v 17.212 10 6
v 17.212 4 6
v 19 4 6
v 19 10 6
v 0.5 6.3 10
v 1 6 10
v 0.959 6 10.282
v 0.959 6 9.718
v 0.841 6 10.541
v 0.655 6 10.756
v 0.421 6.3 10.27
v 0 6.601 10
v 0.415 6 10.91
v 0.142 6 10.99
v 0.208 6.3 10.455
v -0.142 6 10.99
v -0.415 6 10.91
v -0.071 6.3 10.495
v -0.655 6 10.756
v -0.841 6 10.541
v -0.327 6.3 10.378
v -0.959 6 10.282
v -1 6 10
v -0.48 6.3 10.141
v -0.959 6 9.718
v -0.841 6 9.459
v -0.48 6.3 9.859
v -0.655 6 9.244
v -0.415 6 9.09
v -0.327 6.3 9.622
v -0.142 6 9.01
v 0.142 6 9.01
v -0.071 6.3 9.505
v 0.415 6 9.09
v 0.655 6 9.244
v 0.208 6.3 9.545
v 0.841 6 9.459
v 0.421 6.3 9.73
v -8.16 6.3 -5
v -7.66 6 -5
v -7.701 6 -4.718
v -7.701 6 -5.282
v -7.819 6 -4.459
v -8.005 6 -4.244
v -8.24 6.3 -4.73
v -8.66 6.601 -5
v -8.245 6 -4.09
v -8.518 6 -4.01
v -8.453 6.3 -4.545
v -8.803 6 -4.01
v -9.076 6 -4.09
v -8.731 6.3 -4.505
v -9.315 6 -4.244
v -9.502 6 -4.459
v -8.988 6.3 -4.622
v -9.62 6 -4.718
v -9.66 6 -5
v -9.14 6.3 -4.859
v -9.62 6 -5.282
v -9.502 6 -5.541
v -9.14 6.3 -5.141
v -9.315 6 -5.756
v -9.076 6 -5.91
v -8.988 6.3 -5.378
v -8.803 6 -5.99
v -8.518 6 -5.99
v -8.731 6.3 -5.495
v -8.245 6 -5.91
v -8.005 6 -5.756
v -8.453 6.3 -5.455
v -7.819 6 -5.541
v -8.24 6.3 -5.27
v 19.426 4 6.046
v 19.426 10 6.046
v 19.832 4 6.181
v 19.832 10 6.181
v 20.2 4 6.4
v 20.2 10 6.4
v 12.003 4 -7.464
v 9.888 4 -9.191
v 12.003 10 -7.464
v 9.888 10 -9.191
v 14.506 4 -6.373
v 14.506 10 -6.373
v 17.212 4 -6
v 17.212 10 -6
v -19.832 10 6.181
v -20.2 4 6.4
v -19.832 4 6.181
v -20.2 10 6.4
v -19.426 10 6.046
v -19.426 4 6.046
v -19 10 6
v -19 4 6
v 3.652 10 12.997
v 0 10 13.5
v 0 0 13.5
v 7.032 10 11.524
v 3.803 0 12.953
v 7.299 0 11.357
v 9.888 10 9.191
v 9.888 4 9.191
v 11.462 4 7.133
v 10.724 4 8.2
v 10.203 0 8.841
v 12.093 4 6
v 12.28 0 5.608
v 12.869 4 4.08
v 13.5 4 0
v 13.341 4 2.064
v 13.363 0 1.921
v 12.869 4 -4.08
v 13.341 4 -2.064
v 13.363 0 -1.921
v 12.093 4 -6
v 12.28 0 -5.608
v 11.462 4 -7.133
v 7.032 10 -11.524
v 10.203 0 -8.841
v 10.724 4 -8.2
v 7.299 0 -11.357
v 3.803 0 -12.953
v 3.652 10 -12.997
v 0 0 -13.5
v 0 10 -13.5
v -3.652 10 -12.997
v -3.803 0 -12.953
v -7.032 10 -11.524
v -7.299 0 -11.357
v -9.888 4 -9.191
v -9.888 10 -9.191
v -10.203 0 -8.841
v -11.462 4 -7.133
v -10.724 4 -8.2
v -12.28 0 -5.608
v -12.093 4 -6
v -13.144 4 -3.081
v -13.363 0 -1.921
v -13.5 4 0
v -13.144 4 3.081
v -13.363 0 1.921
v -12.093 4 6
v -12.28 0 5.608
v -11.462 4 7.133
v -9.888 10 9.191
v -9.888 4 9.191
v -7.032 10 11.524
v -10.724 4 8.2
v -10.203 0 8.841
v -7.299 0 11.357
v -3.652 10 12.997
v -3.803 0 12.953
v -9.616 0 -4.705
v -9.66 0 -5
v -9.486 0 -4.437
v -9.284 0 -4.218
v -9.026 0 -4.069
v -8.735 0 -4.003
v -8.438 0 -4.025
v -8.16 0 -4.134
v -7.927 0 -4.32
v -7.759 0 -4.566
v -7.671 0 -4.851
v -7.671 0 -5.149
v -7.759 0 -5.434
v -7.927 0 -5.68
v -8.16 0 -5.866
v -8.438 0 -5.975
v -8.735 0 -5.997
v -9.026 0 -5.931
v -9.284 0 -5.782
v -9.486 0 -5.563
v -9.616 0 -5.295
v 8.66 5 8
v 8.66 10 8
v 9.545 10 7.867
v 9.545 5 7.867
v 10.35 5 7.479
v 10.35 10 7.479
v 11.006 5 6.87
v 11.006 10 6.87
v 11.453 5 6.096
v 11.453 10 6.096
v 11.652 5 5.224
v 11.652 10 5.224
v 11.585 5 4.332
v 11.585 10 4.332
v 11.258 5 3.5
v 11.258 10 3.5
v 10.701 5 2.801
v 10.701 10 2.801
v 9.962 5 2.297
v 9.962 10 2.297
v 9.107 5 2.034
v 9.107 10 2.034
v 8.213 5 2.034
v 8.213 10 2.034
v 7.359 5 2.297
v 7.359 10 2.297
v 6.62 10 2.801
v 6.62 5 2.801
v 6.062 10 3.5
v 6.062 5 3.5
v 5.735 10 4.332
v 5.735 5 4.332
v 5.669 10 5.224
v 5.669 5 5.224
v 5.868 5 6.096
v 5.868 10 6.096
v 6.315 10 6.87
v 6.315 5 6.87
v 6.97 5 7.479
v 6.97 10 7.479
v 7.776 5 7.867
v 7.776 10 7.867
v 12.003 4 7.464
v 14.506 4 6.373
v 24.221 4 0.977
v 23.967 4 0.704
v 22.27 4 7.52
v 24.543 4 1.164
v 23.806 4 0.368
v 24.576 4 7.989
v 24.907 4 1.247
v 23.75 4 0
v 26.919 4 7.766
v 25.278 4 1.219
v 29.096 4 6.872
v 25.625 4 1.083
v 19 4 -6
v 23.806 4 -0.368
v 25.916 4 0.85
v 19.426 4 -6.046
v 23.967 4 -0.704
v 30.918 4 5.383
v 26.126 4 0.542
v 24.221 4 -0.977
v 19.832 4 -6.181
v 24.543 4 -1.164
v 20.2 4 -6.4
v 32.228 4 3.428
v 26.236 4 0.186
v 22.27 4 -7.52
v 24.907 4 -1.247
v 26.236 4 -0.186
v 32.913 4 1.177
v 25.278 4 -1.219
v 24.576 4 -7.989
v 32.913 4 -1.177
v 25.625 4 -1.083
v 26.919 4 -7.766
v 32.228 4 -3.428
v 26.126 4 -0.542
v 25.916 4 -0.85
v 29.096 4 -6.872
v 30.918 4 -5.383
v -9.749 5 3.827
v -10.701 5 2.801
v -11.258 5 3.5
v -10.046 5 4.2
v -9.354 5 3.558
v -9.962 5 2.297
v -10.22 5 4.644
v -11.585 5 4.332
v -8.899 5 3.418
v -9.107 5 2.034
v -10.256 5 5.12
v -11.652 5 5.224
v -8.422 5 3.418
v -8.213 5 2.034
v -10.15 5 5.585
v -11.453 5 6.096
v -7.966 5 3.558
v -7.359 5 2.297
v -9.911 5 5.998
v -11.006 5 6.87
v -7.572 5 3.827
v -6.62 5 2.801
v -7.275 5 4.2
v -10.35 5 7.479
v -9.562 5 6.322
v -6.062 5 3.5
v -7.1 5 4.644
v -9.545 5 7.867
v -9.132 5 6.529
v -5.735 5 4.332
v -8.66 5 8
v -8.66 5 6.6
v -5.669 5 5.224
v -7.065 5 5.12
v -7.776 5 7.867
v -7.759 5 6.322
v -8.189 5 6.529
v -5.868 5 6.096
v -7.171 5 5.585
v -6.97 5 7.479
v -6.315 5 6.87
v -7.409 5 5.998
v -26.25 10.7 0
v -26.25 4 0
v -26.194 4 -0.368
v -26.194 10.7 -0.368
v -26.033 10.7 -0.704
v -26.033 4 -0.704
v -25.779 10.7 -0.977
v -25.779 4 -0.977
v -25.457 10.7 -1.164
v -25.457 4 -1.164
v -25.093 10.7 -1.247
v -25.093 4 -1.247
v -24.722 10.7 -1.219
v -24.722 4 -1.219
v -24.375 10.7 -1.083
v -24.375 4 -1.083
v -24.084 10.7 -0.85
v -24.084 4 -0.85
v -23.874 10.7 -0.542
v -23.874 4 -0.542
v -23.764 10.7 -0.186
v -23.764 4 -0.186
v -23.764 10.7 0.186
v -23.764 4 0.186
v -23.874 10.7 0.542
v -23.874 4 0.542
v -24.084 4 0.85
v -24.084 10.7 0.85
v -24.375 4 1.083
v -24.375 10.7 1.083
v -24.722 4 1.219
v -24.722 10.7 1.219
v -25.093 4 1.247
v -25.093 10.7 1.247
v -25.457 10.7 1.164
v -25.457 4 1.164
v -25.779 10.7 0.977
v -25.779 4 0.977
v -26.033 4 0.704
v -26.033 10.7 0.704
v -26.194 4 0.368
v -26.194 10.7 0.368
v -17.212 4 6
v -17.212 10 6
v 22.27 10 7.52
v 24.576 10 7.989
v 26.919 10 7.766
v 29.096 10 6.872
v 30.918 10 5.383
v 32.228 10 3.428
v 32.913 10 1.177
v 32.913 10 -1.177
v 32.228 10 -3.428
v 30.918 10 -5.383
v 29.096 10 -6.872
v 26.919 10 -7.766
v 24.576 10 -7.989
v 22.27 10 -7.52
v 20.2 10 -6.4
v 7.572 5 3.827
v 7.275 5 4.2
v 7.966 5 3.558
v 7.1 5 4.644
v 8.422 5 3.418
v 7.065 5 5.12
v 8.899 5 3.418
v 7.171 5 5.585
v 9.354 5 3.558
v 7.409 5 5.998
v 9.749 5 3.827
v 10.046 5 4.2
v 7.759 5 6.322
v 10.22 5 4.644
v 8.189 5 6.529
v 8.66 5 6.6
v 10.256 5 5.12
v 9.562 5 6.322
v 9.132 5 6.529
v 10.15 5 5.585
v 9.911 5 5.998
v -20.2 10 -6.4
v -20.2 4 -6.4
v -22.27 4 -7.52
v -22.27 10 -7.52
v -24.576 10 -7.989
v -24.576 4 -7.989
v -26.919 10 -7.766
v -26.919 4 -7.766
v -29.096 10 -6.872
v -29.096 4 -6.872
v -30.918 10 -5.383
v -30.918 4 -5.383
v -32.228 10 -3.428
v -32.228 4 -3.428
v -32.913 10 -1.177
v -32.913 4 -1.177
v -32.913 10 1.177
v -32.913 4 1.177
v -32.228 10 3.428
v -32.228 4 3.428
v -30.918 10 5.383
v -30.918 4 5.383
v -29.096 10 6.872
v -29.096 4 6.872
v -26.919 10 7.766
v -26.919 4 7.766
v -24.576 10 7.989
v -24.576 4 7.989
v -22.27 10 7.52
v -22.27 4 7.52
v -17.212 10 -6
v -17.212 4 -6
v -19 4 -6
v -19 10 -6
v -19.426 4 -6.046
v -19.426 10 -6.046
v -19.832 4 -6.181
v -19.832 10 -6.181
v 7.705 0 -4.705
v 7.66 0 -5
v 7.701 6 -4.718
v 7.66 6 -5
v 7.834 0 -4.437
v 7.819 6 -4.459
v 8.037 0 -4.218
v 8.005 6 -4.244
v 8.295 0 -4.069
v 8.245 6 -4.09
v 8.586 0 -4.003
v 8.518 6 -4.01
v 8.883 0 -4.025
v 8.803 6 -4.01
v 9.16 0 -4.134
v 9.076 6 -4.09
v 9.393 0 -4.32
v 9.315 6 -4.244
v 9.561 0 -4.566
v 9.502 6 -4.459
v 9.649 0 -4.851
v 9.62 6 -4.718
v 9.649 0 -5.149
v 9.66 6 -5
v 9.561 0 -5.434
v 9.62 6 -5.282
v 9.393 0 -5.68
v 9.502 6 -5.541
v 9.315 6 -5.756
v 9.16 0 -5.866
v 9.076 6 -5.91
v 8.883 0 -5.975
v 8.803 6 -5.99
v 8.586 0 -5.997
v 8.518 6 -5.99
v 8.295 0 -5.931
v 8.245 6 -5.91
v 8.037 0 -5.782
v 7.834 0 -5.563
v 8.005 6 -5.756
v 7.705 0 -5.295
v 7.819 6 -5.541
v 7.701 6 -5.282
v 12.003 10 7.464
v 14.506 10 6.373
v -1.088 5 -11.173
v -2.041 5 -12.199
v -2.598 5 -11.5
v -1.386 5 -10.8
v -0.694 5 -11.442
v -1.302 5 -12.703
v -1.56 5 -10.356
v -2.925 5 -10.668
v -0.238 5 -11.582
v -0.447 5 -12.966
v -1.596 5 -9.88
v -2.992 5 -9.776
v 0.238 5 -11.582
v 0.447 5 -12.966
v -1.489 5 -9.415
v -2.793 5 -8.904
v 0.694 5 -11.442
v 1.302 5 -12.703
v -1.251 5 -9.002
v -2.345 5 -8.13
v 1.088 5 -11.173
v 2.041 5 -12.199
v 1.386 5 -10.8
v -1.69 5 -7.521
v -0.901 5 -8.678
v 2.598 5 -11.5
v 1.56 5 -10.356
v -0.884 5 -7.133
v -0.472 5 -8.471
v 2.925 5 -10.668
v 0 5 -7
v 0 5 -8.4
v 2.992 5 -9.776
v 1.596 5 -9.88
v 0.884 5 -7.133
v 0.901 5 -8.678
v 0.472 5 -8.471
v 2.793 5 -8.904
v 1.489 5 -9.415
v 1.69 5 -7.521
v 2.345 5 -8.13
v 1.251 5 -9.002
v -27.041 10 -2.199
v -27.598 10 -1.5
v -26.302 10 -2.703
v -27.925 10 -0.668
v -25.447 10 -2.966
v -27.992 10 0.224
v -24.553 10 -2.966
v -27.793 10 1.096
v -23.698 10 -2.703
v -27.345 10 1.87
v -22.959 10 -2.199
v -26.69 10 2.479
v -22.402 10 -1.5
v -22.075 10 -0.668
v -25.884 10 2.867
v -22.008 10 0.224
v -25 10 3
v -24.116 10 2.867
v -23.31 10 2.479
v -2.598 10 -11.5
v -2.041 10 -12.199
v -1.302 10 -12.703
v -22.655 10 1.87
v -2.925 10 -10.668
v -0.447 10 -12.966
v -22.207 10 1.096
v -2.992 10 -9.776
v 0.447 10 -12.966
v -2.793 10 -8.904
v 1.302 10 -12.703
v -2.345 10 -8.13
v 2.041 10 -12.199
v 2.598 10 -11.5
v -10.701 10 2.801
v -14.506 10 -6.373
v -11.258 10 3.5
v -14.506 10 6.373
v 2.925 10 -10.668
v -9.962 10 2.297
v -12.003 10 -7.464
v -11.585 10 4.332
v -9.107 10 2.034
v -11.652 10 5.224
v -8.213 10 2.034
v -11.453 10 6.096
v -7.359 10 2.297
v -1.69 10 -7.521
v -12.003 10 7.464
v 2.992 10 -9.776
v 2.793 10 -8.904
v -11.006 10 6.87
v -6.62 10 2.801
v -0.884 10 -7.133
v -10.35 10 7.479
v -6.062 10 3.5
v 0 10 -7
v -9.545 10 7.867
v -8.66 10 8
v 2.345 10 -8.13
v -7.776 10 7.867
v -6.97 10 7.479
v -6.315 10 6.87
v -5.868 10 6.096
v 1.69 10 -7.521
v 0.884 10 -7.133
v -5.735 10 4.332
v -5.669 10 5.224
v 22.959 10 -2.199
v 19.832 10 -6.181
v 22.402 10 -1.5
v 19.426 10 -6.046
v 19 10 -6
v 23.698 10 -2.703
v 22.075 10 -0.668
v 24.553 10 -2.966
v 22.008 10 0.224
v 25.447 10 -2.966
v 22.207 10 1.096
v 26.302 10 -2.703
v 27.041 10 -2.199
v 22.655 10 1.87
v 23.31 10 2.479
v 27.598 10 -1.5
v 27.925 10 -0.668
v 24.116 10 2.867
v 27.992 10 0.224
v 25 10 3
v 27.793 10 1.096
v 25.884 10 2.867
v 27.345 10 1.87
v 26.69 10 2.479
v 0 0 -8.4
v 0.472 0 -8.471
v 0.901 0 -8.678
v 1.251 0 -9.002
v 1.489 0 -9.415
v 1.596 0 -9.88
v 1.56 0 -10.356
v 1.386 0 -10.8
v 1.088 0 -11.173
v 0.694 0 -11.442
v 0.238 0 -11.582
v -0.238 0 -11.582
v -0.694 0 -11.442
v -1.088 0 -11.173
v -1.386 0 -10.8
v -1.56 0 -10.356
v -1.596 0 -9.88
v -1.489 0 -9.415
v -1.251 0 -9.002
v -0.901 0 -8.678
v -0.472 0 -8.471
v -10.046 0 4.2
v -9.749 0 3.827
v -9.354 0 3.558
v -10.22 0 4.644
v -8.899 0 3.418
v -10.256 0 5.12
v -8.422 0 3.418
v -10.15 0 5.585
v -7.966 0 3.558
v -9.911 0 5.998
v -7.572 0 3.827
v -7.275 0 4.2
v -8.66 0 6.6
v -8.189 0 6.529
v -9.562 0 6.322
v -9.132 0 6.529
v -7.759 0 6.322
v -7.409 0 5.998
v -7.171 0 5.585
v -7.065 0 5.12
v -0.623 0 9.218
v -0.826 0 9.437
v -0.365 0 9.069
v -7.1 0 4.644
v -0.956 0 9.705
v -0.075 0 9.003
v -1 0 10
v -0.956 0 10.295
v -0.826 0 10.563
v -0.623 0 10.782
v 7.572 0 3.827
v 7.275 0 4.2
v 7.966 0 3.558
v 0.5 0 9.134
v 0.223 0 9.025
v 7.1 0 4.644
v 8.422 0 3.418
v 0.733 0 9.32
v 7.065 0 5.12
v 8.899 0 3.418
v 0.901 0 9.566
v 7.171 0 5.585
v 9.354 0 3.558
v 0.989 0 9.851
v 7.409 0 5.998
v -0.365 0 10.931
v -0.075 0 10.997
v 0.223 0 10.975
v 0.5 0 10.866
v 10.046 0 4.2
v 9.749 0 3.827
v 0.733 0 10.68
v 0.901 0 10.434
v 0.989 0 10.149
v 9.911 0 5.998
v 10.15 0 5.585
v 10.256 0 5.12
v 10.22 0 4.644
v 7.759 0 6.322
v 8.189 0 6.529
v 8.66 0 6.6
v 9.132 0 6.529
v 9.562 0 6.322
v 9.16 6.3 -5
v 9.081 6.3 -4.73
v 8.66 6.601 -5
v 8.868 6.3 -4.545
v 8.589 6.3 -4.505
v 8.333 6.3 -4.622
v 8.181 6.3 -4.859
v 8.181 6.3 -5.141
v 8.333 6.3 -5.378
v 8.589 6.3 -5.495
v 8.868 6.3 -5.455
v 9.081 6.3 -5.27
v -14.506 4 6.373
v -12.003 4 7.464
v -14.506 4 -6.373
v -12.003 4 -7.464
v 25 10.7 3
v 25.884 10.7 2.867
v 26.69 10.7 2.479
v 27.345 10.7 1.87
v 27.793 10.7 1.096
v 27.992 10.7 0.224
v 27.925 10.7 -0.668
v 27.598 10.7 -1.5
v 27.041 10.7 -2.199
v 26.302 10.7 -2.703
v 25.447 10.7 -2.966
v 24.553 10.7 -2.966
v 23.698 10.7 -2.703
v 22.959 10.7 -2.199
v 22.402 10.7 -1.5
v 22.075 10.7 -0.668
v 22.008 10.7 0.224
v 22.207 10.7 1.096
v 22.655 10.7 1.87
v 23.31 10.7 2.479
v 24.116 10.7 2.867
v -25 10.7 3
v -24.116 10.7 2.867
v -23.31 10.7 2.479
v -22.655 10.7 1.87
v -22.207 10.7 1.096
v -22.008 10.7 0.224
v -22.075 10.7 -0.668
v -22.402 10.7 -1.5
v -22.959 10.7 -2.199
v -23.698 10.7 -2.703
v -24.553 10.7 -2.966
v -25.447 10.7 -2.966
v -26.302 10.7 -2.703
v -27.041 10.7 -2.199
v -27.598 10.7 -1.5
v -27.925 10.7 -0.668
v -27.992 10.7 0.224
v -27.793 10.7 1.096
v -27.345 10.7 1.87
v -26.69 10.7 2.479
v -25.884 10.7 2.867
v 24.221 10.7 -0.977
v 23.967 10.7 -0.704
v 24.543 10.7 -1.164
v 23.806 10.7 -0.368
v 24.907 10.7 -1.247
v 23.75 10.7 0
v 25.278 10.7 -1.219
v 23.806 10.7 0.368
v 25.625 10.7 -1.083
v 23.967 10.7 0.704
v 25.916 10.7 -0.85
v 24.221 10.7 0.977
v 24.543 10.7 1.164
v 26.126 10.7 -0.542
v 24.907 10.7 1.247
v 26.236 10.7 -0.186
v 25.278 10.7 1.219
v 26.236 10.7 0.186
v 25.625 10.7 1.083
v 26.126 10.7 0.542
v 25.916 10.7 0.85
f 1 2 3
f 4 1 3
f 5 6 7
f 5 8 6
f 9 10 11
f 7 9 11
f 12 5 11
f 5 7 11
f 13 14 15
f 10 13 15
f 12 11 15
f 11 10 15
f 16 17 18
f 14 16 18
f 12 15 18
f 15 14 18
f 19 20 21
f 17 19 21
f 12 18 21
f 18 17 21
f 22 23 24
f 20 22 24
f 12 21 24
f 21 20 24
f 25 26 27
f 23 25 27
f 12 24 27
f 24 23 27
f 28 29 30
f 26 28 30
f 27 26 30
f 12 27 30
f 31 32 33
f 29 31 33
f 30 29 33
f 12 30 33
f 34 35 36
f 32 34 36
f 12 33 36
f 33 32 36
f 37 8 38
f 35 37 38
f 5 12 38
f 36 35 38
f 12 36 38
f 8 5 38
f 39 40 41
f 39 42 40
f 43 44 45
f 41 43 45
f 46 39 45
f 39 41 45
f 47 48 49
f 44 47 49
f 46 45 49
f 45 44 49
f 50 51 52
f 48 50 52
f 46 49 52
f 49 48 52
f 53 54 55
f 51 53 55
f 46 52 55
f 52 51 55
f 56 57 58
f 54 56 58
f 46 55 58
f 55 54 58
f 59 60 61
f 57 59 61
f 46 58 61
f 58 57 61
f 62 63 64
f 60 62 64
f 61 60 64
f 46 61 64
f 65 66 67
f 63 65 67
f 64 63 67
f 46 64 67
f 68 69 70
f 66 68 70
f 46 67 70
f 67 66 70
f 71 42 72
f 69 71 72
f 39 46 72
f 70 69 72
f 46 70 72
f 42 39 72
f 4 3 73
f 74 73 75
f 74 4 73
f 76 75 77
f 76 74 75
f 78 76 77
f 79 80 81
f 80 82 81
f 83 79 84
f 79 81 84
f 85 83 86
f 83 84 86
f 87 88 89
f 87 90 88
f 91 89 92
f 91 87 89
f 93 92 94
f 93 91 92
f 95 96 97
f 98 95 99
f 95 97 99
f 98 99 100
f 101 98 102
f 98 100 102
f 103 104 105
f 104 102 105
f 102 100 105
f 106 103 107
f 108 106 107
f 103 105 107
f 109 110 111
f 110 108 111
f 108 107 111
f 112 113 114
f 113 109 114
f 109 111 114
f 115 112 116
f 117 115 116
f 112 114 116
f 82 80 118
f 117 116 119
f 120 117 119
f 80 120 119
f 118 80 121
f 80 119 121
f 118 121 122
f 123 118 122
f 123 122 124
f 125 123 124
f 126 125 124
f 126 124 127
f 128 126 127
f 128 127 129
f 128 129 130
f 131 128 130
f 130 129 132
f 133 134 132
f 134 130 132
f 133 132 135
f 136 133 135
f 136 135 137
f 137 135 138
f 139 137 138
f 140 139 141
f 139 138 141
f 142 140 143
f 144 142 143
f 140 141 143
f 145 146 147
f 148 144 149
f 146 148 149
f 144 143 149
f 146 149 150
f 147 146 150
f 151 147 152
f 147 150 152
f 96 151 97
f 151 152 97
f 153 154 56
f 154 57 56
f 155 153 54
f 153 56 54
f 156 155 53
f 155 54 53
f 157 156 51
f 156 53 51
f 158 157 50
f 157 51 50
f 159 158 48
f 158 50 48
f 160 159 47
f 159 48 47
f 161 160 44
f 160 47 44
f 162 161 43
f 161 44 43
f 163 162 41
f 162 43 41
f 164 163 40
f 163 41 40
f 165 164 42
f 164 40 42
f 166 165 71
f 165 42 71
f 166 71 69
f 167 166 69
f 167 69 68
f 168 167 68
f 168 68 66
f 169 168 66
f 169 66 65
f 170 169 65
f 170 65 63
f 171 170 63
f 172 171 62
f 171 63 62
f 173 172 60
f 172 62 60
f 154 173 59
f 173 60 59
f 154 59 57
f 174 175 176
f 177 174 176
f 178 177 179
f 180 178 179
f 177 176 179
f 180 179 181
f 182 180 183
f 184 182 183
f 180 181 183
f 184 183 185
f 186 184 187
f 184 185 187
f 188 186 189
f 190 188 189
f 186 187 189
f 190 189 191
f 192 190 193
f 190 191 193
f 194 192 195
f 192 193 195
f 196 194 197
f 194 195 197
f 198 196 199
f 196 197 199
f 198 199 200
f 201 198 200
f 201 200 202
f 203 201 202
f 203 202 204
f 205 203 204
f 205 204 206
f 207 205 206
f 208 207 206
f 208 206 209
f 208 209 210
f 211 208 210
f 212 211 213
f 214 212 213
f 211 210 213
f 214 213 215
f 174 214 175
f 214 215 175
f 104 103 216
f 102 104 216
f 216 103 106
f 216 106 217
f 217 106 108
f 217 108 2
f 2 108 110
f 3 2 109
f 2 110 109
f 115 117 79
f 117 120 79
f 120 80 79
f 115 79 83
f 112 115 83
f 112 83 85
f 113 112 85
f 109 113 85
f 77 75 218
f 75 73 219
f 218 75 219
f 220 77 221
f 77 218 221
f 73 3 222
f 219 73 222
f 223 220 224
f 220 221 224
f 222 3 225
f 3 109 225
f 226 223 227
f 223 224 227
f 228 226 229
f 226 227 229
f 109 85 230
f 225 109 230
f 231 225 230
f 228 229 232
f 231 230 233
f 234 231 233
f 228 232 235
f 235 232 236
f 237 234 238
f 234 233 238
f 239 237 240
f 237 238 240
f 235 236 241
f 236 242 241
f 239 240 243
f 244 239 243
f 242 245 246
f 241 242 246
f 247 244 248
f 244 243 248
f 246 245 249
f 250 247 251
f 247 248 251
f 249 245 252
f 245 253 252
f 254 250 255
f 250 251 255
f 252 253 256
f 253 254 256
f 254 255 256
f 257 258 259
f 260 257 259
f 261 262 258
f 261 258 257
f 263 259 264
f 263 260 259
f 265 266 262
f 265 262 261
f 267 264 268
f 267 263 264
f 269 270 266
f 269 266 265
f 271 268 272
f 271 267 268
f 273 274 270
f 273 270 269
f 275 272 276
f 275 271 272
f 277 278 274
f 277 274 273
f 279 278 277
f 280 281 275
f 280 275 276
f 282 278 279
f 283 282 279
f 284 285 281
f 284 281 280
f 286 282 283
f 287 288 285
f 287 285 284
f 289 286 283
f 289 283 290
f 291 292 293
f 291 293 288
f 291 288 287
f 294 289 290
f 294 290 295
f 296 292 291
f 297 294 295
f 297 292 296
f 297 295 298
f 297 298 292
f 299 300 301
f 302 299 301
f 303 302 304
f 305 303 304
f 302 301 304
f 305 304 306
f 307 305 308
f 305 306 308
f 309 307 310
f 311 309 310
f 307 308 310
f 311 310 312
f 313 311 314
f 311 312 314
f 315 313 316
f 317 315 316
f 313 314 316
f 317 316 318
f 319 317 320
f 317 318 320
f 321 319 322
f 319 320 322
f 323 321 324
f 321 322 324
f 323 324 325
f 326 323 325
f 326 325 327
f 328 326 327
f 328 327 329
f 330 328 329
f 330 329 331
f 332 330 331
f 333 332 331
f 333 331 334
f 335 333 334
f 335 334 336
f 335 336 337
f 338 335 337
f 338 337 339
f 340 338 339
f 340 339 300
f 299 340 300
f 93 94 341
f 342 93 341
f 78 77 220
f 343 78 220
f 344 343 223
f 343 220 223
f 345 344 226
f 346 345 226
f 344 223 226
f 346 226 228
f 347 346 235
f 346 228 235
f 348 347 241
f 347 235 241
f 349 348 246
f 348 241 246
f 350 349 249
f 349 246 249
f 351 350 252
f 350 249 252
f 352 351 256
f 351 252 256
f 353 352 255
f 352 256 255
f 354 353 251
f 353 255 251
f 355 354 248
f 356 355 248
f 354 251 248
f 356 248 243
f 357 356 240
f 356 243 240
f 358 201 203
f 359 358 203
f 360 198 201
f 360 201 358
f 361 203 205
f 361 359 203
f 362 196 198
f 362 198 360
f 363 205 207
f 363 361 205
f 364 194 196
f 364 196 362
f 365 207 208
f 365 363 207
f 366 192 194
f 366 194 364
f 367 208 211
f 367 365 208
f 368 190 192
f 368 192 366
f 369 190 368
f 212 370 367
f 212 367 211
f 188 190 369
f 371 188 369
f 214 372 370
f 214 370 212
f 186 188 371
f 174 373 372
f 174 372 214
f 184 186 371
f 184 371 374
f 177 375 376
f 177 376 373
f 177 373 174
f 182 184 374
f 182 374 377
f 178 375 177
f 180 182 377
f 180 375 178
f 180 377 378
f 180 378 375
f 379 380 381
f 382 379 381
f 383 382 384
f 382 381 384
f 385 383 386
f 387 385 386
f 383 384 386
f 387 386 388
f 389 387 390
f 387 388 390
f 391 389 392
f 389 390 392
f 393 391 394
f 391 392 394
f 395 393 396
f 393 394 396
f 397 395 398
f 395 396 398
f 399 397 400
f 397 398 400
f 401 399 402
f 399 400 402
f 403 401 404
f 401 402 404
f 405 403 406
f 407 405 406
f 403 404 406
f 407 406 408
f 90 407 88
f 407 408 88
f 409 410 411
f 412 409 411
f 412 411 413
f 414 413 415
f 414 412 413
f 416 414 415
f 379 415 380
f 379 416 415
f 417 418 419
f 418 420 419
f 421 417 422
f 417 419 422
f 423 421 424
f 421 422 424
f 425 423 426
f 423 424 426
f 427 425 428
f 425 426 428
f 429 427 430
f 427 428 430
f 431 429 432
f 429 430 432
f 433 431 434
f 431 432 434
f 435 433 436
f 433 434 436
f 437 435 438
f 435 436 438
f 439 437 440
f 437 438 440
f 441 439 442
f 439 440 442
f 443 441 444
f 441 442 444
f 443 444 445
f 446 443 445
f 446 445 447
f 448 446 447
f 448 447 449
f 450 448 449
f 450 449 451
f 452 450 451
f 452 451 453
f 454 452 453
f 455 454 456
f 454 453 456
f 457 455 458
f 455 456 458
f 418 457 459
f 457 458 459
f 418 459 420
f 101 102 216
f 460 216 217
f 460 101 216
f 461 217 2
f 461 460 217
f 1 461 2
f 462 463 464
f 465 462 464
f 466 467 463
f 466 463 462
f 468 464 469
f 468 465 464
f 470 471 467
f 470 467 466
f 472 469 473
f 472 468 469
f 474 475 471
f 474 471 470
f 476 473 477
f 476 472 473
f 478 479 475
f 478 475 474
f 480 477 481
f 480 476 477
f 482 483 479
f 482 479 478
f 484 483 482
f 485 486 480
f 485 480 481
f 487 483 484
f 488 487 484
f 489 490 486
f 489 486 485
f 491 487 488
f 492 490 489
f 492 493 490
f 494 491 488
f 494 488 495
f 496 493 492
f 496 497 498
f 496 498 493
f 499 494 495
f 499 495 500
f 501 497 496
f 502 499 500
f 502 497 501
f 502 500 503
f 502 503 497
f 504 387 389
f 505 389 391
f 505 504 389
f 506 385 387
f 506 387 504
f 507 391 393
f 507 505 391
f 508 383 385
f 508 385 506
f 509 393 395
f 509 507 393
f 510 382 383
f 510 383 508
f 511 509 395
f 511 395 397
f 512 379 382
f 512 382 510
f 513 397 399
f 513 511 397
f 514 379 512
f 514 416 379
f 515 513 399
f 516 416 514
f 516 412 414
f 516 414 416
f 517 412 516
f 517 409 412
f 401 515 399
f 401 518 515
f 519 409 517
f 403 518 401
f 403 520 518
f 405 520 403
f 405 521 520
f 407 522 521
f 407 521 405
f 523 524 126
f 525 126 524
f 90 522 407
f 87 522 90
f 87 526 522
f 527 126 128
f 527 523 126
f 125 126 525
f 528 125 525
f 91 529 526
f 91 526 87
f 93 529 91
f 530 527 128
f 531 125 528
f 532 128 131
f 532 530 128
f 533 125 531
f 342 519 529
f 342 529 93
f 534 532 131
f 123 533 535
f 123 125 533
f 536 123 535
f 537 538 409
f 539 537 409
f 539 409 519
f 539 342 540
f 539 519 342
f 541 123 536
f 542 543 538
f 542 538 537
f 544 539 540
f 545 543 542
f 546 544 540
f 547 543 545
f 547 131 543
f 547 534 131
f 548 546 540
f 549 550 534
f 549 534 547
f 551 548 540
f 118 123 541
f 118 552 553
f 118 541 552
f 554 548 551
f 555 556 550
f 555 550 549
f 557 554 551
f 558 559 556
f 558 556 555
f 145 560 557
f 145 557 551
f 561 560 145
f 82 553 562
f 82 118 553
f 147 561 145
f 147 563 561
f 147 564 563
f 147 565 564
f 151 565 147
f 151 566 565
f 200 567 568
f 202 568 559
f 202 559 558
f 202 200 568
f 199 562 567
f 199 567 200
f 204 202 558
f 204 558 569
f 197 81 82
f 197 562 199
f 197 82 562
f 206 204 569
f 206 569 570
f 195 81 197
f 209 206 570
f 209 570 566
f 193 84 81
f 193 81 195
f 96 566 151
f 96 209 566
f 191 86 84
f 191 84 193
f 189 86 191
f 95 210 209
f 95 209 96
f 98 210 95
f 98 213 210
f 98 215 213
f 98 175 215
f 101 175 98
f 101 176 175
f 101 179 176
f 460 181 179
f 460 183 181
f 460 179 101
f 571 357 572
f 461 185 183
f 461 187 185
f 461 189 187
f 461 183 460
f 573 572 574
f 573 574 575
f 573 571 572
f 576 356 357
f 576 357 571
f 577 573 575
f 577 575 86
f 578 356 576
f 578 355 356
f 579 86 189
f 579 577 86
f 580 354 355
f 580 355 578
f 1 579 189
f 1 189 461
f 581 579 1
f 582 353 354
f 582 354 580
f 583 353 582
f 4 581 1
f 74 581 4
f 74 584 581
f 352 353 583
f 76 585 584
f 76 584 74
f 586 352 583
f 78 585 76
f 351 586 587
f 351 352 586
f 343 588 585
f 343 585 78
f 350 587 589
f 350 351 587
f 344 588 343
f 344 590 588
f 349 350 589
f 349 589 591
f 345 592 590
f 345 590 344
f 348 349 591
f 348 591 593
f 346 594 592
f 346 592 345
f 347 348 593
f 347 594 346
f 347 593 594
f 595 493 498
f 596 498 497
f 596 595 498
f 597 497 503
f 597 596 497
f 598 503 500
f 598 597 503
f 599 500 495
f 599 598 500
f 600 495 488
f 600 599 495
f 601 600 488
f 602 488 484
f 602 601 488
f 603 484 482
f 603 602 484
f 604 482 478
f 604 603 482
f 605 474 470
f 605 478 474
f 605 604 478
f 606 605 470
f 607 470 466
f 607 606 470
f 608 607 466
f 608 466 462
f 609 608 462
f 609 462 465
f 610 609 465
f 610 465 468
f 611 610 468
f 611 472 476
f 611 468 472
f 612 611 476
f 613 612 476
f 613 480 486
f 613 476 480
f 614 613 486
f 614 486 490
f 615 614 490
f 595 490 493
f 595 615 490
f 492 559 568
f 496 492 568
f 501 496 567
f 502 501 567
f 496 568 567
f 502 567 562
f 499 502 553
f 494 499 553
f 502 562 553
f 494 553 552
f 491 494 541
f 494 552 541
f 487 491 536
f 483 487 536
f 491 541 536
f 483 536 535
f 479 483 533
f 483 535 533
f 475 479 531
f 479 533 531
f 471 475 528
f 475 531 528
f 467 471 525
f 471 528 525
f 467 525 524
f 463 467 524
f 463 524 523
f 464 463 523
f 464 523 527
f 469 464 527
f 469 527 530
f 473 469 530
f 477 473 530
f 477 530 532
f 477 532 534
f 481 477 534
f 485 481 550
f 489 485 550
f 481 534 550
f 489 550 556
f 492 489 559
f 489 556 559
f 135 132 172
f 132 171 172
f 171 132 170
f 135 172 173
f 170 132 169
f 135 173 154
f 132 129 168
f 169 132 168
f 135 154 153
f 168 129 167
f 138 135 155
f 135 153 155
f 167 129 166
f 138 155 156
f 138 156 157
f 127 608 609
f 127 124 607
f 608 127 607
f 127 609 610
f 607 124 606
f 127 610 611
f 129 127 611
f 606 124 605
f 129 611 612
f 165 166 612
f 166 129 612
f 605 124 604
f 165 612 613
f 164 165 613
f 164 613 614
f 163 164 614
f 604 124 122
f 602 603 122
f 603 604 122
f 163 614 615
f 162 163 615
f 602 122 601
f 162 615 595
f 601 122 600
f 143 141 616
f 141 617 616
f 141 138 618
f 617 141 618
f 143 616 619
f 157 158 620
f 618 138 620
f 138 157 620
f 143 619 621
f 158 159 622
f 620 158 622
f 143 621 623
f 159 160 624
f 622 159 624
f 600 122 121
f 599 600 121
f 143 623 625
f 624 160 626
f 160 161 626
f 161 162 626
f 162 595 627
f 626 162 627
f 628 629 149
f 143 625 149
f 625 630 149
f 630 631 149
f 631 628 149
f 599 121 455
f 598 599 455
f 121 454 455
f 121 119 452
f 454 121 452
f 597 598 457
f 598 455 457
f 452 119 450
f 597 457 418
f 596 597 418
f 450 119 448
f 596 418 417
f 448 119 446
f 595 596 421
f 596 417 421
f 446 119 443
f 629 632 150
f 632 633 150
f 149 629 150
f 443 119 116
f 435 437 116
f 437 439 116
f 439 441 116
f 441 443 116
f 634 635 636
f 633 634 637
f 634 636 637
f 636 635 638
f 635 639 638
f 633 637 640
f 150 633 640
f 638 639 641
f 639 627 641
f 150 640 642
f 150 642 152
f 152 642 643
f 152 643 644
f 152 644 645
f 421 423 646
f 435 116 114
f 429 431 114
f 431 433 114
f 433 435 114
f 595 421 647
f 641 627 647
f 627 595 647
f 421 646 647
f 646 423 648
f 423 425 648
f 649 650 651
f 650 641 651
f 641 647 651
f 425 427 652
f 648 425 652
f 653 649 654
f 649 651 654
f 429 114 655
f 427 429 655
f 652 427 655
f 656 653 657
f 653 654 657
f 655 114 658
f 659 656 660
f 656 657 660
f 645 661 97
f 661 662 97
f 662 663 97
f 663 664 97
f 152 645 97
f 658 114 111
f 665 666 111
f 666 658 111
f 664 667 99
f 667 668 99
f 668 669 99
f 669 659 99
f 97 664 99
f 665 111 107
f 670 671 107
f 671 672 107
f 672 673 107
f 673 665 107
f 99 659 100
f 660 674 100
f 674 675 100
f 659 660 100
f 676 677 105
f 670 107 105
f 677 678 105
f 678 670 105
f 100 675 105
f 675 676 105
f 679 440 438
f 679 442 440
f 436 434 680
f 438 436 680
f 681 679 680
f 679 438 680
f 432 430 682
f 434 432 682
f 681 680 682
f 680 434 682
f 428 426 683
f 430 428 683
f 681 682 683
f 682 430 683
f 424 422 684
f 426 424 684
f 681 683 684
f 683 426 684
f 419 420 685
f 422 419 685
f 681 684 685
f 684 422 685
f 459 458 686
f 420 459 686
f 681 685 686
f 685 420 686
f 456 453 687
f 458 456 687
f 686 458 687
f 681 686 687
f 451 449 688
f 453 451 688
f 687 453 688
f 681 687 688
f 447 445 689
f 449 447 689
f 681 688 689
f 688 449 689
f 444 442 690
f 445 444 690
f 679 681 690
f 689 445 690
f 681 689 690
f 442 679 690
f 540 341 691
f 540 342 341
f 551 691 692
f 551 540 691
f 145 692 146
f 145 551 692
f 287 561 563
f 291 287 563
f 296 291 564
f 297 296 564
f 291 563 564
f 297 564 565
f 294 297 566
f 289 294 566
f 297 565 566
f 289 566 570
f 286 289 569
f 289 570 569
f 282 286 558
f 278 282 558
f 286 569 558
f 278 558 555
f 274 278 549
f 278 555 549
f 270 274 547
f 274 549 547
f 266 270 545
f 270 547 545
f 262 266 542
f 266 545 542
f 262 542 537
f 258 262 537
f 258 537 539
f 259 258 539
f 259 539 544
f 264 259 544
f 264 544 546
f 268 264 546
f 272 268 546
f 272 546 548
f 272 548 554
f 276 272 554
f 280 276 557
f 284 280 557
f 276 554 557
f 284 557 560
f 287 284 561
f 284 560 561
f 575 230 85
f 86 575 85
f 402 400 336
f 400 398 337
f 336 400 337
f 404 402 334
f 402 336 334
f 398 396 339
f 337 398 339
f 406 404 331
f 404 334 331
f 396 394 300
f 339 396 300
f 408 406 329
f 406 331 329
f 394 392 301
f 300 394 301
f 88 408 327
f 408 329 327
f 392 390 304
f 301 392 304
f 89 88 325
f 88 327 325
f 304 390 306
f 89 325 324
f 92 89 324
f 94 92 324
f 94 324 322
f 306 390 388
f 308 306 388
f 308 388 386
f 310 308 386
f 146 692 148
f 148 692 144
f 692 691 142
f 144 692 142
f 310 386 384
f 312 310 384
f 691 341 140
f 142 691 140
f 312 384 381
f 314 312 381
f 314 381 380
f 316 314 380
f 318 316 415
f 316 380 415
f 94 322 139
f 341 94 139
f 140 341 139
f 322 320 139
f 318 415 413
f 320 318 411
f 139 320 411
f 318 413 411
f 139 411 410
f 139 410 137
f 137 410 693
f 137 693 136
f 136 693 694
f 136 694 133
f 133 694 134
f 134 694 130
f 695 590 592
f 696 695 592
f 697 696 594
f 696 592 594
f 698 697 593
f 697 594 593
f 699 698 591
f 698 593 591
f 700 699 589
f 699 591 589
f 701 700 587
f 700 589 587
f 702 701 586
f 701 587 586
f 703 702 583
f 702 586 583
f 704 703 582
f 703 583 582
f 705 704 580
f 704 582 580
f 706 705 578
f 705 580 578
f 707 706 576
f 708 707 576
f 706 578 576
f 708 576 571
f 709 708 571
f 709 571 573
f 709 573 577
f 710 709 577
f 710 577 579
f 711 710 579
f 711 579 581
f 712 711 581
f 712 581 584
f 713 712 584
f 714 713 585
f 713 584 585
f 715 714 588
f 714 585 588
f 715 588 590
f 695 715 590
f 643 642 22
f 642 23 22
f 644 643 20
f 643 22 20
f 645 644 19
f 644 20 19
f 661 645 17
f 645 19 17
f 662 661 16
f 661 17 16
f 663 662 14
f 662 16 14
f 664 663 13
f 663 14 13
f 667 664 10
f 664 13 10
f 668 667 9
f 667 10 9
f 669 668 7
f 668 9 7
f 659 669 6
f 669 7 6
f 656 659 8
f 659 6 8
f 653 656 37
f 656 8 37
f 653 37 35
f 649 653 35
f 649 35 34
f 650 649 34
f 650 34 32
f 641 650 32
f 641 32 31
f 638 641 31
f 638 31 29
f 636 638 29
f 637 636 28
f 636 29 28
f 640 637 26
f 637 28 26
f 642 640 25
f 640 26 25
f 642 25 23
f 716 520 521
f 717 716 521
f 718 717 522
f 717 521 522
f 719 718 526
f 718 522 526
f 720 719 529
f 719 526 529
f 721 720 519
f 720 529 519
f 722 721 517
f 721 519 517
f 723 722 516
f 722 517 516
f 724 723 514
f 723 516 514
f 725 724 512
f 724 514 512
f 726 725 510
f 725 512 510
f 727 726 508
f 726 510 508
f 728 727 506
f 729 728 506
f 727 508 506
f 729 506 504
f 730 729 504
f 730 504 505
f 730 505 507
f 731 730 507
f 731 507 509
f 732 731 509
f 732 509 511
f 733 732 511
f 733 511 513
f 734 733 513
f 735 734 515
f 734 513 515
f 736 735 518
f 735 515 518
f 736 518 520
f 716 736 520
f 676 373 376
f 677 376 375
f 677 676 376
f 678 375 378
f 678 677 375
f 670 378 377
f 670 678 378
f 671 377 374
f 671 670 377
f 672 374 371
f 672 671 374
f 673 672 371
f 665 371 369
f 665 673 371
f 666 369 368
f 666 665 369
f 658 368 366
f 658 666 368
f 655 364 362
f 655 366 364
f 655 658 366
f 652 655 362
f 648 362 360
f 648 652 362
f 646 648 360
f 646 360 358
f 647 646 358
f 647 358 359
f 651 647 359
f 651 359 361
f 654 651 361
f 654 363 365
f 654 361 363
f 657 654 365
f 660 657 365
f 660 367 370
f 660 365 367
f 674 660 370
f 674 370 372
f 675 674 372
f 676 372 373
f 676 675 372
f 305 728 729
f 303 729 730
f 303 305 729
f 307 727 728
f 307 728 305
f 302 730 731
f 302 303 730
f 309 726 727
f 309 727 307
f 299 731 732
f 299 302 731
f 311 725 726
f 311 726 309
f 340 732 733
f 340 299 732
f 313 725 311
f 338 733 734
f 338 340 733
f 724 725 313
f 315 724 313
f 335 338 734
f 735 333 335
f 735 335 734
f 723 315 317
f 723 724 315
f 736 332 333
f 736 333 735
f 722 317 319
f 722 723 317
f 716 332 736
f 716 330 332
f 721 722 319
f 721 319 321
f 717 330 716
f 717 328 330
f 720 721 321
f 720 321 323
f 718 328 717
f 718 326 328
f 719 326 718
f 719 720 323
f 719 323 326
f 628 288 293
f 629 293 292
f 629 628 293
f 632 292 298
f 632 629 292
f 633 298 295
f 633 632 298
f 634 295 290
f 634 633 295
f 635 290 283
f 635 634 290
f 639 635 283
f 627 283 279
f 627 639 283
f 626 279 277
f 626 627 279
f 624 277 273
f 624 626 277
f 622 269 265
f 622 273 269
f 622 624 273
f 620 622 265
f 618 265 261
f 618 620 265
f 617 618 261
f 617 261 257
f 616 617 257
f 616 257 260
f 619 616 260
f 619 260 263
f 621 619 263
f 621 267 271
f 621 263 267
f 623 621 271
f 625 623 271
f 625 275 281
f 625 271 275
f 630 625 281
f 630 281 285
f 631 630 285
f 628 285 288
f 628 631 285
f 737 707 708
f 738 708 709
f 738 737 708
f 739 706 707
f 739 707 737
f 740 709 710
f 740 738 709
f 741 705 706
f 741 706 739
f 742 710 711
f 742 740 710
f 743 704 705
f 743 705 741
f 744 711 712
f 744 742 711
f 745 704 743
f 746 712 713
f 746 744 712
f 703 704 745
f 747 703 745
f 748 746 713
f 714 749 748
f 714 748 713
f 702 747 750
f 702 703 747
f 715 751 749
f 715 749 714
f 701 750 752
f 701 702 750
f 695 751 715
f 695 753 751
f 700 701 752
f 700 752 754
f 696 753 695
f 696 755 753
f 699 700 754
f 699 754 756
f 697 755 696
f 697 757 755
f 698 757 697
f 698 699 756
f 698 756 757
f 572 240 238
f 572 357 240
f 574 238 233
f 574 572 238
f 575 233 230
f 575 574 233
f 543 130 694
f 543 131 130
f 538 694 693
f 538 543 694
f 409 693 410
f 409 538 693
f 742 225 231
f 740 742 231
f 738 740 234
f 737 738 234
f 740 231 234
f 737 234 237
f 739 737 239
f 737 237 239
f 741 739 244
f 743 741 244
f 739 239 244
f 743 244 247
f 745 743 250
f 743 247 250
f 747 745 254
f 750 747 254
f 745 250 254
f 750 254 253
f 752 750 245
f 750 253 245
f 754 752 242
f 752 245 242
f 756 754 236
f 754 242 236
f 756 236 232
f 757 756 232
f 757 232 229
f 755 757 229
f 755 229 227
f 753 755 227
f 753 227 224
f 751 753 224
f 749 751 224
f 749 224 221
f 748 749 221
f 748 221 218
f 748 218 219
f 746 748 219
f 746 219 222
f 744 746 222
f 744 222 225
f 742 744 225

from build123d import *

# Parameters (mm, degrees)
SKETCH_1_R          = 13.5
SKETCH_1_R_2        = 1.6
EXTRUDE_1_DEPTH     = 10
EXTRUDE_START       = -6
SKETCH_2_R          = 1
EXTRUDE_2_DEPTH     = 6
SKETCH_3_R          = 3
CUT_EXTRUDE_1_DEPTH = 5
SKETCH_4_R          = 3
SKETCH_4_R_2        = 1
EXTRUDE_3_DEPTH     = 0.7
FILLET_1_R          = 10
FILLET_2_R          = 2
HOLE_WIZARD_M3_1_D  = 2.5
F_2_0MM_2_D         = 2
F_2_0MM_2_DEPTH     = 6
F_2_0MM_2_TIP       = 0.600860619


with BuildPart() as part:
    # 草图1 → 凸台-拉伸1 (new body)
    with BuildSketch(Plane(origin=(0, 0, 0), x_dir=(1, 0, 0), z_dir=(0, 1, 0))):
        with Locations(Location((0, 0, 0), (0, 0, 270))):
            Circle(SKETCH_1_R)
        with Locations(Location((0, 10, 0), (0, 0, 270))):
            Circle(SKETCH_1_R_2, mode=Mode.SUBTRACT)
        with Locations(Location((8.660254038, -5, 0), (0, 0, 270))):
            Circle(SKETCH_1_R_2, mode=Mode.SUBTRACT)
        with Locations(Location((-8.660254038, -5, 0), (0, 0, 270))):
            Circle(SKETCH_1_R_2, mode=Mode.SUBTRACT)
    extrude(amount=EXTRUDE_1_DEPTH)

    # 草图2 → 凸台-拉伸2 (add)
    # profile 1 of 2: a face of its own
    with BuildSketch(Plane(origin=(0, 10, 0), x_dir=(1, 0, 0), z_dir=(0, 1, 0)).offset(EXTRUDE_START)):
        with BuildLine():
            Line((-12.093386622, 6), (-19.708497378, 6))
            ThreePointArc((-19.708497378, 6), (-33, 0), (-19.708497378, -6))
            Line((-19.708497378, -6), (-12.093386622, -6))
            ThreePointArc((-12.093386622, -6), (-13.5, 0), (-12.093386622, 6))
        make_face()
        with Locations(Location((-25, 0, 0), (0, 0, 270))):
            Circle(SKETCH_2_R, mode=Mode.SUBTRACT)
    # profile 2 of 2: a face of its own
    with BuildSketch(Plane(origin=(0, 10, 0), x_dir=(1, 0, 0), z_dir=(0, 1, 0)).offset(EXTRUDE_START)):
        with BuildLine():
            ThreePointArc((13.5, 0), (13.143643319, -3.08133742), (12.093386622, -6))
            Line((12.093386622, -6), (19.708497378, -6))
            ThreePointArc((19.708497378, -6), (33, 0), (19.708497378, 6))
            Line((19.708497378, 6), (12.093386622, 6))
            ThreePointArc((12.093386622, 6), (13.143643319, 3.08133742), (13.5, 0))
        make_face()
        with Locations(Location((25, 0, 0), (0, 0, 270))):
            Circle(SKETCH_2_R, mode=Mode.SUBTRACT)
    extrude(amount=EXTRUDE_2_DEPTH)

    # 草图3 → 切除-拉伸1 (cut)
    with BuildSketch(Plane(origin=(0, 10, 0), x_dir=(1, 0, 0), z_dir=(0, 1, 0))):
        with Locations(Location((0, 10, 0), (0, 0, 270))):
            Circle(SKETCH_3_R)
        with Locations(Location((8.660254038, -5, 0), (0, 0, 270))):
            Circle(SKETCH_3_R)
        with Locations(Location((-8.660254038, -5, 0), (0, 0, 270))):
            Circle(SKETCH_3_R)
    extrude(amount=-CUT_EXTRUDE_1_DEPTH, mode=Mode.SUBTRACT)

    # 草图4 → 凸台-拉伸3 (add)
    # profile 1 of 2: a face of its own
    with BuildSketch(Plane(origin=(0, 10, 0), x_dir=(1, 0, 0), z_dir=(0, 1, 0))):
        with Locations(Location((-25, 0, 0), (0, 0, 270))):
            Circle(SKETCH_4_R)
        with Locations(Location((-25, 0, 0), (0, 0, 270))):
            Circle(SKETCH_4_R_2, mode=Mode.SUBTRACT)
    # profile 2 of 2: a face of its own
    with BuildSketch(Plane(origin=(0, 10, 0), x_dir=(1, 0, 0), z_dir=(0, 1, 0))):
        with Locations(Location((25, 0, 0), (0, 0, 270))):
            Circle(SKETCH_4_R)
        with Locations(Location((25, 0, 0), (0, 0, 270))):
            Circle(SKETCH_4_R_2, mode=Mode.SUBTRACT)
    extrude(amount=EXTRUDE_3_DEPTH)

    # 圆角1
    fillet_1_edges = [part.edges().sort_by_distance(p)[0] for p in [
        (-12.093386622, 7, -6),
        (-12.093386622, 7, 6),
        (12.093386622, 7, 6),
        (12.093386622, 7, -6),
    ]]
    fillet(fillet_1_edges, radius=FILLET_1_R)

    # 圆角2
    fillet_2_edges = [part.edges().sort_by_distance(p)[0] for p in [
        (-19.708497378, 7, -6),
        (-19.708497378, 7, 6),
        (19.708497378, 7, -6),
        (19.708497378, 7, 6),
    ]]
    fillet(fillet_2_edges, radius=FILLET_2_R)

    # M3 螺纹孔1 (through all)
    with Locations(Plane(origin=(0, 10.7, 0), x_dir=(1, 0, 0), z_dir=(0, 1, 0))):
        with Locations((-25, 0), (25, 0)):
            Hole(HOLE_WIZARD_M3_1_D / 2)

    # Ø2.0mm 暗销孔2
    with Locations(Plane.XZ):
        with Locations((-8.660254038, -5), (0, 10), (8.660254038, -5)):
            Hole(F_2_0MM_2_D / 2, depth=F_2_0MM_2_DEPTH)
            with Locations((0, 0, -(F_2_0MM_2_DEPTH + F_2_0MM_2_TIP / 2))):  # 118° drill point
                Cone(0, F_2_0MM_2_D / 2, F_2_0MM_2_TIP, mode=Mode.SUBTRACT)


solid = part.part
